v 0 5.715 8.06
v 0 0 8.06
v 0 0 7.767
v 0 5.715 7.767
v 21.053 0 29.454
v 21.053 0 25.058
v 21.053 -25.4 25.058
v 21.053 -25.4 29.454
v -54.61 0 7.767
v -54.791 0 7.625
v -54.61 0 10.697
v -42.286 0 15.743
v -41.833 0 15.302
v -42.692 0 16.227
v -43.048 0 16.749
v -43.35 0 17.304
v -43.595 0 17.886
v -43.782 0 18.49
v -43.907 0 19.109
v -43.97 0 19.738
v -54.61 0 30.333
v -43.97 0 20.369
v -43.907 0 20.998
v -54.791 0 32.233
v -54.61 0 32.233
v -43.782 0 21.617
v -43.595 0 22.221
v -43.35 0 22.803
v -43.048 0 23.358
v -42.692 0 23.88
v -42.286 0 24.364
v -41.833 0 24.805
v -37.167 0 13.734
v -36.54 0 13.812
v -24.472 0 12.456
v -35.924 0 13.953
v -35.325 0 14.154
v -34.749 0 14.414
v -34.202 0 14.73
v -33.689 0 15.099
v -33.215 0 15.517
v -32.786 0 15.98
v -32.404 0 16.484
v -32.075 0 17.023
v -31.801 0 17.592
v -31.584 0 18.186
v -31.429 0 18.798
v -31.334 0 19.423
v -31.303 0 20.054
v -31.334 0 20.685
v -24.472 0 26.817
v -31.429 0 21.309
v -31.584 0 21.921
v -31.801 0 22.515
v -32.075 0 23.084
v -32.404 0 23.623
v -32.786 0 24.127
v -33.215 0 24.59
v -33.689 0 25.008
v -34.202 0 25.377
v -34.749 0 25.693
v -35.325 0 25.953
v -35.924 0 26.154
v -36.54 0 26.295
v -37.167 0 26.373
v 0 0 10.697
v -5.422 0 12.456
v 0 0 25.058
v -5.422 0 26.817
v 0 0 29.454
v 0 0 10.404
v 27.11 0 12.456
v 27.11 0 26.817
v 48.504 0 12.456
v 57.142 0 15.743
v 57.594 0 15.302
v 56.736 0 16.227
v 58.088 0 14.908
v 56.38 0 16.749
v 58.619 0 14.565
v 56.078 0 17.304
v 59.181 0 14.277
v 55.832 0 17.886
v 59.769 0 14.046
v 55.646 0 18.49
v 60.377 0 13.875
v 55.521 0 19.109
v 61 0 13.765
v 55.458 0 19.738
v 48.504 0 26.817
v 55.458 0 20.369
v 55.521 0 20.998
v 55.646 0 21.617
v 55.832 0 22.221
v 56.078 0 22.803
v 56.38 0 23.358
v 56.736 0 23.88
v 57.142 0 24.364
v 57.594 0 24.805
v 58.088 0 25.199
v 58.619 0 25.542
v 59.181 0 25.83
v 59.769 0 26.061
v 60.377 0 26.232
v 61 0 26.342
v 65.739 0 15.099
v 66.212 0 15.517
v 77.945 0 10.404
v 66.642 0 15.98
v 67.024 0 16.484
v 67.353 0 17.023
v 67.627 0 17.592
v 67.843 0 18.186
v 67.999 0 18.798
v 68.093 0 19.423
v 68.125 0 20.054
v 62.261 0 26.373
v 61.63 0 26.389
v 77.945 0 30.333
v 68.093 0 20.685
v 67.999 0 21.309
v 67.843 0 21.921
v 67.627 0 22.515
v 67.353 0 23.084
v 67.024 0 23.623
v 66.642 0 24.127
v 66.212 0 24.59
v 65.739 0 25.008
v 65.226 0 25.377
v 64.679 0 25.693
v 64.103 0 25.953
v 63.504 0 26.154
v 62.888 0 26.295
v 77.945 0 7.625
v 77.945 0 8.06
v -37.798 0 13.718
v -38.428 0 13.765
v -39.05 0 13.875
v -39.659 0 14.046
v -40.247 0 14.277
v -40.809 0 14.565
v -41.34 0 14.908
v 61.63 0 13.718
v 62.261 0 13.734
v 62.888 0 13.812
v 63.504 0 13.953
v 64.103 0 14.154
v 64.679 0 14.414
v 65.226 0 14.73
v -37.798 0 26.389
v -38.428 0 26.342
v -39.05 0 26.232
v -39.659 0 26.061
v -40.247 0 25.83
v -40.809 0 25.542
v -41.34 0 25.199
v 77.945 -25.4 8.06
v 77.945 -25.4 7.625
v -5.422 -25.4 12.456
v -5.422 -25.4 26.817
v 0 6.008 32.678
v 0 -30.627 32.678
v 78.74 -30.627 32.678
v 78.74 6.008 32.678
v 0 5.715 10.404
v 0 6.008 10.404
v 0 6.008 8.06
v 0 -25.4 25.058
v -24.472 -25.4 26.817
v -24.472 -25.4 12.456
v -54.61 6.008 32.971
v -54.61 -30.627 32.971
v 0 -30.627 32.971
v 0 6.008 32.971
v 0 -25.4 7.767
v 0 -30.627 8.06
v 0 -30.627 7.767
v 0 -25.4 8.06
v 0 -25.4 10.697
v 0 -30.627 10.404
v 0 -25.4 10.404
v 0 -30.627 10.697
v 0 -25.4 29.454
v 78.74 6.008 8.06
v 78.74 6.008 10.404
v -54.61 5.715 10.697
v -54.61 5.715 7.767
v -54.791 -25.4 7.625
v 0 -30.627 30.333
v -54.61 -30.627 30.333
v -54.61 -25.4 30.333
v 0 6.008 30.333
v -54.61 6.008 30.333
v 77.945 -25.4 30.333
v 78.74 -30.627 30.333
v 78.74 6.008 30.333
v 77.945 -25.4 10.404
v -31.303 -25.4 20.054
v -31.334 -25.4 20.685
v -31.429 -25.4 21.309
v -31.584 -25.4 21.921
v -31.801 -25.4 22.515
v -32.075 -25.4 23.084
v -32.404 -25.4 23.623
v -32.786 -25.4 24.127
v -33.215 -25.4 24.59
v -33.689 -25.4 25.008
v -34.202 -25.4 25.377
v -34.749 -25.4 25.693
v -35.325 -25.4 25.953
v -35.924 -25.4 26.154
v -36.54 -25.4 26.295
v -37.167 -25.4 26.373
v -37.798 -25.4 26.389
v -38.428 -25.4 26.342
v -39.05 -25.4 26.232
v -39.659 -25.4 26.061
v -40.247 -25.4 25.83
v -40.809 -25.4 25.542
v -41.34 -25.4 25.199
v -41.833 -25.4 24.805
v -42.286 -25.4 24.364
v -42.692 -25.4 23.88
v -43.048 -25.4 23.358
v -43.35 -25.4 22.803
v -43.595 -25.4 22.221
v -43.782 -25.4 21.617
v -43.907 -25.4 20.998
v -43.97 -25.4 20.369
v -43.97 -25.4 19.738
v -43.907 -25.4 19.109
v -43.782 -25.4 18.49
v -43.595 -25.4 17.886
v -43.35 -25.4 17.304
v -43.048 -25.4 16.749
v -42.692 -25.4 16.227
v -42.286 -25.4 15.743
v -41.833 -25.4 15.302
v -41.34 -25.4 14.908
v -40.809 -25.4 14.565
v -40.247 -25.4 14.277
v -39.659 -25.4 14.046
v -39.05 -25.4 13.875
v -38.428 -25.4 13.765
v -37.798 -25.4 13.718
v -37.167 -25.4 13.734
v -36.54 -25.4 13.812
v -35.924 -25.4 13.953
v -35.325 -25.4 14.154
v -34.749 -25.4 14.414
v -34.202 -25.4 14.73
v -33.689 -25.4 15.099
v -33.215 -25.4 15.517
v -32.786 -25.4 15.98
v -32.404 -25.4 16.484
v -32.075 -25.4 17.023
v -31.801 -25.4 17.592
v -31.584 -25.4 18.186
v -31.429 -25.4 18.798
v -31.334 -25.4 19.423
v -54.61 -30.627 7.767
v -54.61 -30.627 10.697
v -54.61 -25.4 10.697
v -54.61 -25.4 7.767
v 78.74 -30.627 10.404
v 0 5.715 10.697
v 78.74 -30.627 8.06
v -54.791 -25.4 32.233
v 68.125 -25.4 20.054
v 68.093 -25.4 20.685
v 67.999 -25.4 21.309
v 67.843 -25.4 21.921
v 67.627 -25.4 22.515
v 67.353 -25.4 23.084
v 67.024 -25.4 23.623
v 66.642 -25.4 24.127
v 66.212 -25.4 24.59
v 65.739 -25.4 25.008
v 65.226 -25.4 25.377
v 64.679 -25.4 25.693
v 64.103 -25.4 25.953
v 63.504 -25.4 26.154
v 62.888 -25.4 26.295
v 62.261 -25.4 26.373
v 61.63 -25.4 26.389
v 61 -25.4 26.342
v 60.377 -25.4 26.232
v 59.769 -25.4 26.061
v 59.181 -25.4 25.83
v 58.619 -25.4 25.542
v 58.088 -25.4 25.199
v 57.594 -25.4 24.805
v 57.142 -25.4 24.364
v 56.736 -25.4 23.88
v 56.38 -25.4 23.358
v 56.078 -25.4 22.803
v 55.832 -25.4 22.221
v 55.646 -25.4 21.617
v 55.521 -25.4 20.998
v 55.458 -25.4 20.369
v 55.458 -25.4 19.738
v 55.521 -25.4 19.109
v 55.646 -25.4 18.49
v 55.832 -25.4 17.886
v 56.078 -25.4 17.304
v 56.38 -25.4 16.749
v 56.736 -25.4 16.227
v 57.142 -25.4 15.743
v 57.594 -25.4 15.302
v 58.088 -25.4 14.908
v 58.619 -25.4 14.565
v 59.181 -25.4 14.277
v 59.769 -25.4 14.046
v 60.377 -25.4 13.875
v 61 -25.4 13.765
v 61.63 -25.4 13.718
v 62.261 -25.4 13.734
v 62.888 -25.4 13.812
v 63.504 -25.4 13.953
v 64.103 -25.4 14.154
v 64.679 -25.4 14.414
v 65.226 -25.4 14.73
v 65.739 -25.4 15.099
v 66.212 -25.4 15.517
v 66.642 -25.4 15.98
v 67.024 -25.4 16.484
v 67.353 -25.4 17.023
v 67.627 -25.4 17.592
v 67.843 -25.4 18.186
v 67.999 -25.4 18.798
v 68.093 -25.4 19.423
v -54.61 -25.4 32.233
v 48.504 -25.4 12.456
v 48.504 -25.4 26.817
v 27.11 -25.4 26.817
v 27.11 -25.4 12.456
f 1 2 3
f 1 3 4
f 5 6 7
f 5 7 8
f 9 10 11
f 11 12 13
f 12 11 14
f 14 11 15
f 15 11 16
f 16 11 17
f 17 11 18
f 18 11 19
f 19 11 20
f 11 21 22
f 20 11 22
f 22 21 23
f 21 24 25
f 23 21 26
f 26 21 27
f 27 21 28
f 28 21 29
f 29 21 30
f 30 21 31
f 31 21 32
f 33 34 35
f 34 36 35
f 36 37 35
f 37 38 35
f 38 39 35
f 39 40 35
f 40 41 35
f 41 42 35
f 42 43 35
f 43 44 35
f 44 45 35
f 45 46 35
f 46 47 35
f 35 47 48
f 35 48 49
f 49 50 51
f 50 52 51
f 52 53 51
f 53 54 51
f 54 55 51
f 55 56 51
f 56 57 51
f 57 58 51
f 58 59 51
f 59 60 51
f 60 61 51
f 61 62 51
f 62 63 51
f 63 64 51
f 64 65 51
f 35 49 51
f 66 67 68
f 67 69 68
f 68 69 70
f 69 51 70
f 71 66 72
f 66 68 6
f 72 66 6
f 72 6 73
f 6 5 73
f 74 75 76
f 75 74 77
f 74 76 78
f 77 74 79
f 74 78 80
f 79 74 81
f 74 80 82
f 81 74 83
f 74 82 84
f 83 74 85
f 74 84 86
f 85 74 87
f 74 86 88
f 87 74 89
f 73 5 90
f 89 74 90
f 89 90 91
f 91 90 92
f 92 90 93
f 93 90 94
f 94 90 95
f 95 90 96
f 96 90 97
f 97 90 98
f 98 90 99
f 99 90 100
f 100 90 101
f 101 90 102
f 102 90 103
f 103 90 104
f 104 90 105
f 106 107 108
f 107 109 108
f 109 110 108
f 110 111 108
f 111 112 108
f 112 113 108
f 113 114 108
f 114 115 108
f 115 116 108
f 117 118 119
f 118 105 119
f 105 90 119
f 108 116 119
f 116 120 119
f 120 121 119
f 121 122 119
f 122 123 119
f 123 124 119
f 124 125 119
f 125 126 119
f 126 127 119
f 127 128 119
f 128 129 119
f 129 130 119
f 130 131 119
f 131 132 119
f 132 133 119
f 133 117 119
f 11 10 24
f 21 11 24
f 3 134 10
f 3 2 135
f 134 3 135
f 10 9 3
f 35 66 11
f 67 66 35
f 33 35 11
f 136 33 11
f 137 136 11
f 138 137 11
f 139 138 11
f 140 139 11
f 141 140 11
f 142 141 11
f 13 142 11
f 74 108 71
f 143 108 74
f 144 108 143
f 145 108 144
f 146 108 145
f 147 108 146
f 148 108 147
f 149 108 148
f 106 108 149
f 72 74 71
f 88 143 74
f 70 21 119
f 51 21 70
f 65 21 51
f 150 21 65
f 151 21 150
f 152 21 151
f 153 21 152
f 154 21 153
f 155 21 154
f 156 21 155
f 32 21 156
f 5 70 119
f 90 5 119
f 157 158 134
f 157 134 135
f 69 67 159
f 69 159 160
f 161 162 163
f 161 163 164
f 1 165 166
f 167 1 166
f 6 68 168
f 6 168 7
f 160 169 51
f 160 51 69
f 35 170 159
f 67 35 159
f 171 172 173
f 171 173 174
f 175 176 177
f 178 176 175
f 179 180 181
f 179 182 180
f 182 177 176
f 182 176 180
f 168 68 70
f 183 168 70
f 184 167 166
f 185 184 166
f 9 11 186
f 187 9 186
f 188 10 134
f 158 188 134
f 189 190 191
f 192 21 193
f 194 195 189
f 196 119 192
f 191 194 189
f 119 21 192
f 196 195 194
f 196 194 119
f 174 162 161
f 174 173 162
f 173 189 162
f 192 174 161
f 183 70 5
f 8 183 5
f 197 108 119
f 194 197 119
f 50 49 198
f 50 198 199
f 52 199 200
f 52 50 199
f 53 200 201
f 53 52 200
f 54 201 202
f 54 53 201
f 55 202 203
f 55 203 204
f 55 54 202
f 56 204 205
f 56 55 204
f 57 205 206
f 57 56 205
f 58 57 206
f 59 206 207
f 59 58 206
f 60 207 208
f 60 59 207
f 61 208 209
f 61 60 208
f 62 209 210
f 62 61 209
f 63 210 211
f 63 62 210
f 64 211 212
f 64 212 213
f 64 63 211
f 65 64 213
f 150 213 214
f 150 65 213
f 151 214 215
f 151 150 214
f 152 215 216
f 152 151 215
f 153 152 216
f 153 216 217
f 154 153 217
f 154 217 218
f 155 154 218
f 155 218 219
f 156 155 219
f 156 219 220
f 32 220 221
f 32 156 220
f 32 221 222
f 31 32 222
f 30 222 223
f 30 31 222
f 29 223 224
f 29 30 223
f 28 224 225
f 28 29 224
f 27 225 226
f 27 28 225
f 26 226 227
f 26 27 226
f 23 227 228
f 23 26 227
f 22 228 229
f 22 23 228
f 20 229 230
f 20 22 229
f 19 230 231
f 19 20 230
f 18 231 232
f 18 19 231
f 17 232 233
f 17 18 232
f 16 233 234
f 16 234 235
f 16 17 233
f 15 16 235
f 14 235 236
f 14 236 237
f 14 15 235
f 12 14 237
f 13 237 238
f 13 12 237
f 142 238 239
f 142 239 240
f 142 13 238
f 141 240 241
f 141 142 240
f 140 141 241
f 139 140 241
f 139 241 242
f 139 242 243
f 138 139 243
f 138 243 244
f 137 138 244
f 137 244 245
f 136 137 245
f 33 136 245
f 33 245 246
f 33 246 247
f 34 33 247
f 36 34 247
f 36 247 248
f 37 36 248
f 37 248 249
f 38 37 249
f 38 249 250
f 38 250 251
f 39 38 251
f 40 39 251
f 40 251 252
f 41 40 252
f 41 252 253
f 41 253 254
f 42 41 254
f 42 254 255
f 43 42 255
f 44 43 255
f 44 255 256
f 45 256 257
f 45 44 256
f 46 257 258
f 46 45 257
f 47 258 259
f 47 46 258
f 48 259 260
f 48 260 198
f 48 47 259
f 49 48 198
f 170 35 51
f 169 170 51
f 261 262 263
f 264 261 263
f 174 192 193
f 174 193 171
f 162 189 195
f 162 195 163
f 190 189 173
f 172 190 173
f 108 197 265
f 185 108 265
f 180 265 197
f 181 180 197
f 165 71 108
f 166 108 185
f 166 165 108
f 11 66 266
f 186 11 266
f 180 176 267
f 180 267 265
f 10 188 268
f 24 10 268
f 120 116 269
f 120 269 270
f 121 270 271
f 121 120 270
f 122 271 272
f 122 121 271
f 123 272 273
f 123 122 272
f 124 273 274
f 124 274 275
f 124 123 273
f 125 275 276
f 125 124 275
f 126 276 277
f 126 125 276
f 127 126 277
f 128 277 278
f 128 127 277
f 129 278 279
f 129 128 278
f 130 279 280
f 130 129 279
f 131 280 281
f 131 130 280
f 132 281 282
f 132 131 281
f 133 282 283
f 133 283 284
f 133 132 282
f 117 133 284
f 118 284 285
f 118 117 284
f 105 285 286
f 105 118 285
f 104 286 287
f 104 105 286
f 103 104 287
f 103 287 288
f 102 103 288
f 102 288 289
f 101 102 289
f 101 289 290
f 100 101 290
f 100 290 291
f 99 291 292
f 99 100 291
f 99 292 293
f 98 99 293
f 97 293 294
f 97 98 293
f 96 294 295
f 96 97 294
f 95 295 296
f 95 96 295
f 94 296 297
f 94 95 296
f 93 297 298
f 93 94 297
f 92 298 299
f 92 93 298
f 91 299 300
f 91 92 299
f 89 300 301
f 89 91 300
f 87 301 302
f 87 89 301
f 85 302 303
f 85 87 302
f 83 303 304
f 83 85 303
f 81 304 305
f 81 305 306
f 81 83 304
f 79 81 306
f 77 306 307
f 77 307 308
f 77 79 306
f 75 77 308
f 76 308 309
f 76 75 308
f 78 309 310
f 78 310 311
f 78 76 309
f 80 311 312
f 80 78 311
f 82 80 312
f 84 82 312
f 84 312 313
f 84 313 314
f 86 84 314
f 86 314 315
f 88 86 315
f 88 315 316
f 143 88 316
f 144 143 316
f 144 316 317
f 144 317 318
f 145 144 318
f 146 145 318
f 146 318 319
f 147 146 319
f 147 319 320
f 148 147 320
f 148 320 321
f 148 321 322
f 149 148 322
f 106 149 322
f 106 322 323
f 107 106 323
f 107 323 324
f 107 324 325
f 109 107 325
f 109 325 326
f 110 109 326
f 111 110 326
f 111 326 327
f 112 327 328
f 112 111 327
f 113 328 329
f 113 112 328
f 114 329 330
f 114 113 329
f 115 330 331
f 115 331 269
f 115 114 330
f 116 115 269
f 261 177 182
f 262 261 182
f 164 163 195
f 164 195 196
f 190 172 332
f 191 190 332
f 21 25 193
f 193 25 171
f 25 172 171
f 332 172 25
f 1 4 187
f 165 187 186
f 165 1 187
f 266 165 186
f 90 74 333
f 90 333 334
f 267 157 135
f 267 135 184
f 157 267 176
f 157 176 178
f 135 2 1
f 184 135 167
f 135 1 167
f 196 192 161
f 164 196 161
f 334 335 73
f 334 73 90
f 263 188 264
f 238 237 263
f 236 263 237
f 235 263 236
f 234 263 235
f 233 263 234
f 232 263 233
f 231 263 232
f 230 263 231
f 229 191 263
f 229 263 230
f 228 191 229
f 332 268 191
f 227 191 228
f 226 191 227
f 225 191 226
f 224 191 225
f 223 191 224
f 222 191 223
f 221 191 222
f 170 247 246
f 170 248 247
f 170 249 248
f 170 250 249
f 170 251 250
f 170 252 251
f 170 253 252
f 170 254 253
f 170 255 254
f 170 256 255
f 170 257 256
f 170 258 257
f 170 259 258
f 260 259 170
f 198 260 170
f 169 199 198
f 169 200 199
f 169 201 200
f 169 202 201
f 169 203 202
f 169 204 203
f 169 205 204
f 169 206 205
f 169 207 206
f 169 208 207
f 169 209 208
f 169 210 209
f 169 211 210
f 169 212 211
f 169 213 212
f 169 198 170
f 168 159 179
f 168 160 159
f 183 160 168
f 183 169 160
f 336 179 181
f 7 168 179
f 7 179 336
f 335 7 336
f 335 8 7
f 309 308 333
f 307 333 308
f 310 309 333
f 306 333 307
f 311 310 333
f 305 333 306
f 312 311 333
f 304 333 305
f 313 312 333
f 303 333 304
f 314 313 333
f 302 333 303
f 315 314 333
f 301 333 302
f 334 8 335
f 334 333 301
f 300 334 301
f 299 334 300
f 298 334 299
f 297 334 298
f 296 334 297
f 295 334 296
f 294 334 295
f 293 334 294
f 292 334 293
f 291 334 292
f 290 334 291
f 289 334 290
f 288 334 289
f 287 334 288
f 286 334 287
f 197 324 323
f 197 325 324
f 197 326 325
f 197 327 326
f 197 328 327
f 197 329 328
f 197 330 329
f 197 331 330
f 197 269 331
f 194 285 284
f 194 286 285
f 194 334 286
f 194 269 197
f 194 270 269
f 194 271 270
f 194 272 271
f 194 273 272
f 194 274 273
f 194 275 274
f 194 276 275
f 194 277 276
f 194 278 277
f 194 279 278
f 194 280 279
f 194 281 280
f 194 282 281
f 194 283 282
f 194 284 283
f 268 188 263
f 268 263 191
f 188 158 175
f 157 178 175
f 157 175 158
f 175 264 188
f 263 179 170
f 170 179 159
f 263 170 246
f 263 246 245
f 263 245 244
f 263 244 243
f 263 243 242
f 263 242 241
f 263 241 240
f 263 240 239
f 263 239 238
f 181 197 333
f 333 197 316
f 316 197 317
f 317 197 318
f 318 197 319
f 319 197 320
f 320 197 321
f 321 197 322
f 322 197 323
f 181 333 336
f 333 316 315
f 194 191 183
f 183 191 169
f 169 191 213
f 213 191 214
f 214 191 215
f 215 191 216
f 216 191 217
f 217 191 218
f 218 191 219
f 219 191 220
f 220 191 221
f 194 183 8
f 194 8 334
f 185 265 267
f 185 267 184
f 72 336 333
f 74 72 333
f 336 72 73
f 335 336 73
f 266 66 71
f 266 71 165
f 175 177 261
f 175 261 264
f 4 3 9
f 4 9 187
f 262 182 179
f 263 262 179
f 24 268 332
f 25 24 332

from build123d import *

# Parameters (mm, degrees)
F0_W     = 132.736026
F0_H     = 24.608365
F0_W_2   = 19.050001
F0_H_2   = 14.360769
F0_W_3   = 21.394616
F0_R     = 6.3373
F1_DEPTH = 25.4
F2_W     = 36.634613
F2_H     = 2.344616
F3_DEPTH = 78.74
F4_W     = 36.634616
F4_H     = 2.637692
F4_W_2   = 36.341539
F4_H_2   = 2.930769
F5_DEPTH = 54.61
F6_W     = 21.052692
F6_H     = 4.396153
F7_DEPTH = 50.8


with BuildPart() as f1:
    # F0 (on Front) → F1 (new body)
    with BuildSketch(Plane.XZ):
        with Locations((11.576537, 19.929231)):
            Rectangle(F0_W, F0_H)
        with Locations((-14.946923, 19.636154)):
            Rectangle(F0_W_2, F0_H_2, mode=Mode.SUBTRACT)
        with Locations((37.806922, 19.636154)):
            Rectangle(F0_W_3, F0_H_2, mode=Mode.SUBTRACT)
        with Locations((-37.640192, 20.053516)):
            Circle(F0_R, mode=Mode.SUBTRACT)
        with Locations((61.787547, 20.053516)):
            Circle(F0_R, mode=Mode.SUBTRACT)
    extrude(amount=F1_DEPTH)

    # F2 (on Right) → F3 (join)
    with BuildSketch(Plane.YZ):
        with Locations((-12.30923, 31.505771)):
            Rectangle(F2_W, F2_H)
        with Locations((-12.30923, 9.231923)):
            Rectangle(F2_W, F2_H)
    extrude(amount=F3_DEPTH)

    # F4 (on Right) → F5 (join)
    with BuildSketch(Plane.YZ):
        with Locations((-12.309231, 31.652309)):
            Rectangle(F4_W, F4_H)
        with Locations((-12.455769, 9.231924)):
            Rectangle(F4_W_2, F4_H_2)
    extrude(amount=-F5_DEPTH)

    # F6 (on Front) → F7 (cut)
    with BuildSketch(Plane.XZ):
        with Locations((10.526346, 27.256155)):
            Rectangle(F6_W, F6_H)
    extrude(amount=F7_DEPTH, mode=Mode.SUBTRACT)


solid = f1.part
